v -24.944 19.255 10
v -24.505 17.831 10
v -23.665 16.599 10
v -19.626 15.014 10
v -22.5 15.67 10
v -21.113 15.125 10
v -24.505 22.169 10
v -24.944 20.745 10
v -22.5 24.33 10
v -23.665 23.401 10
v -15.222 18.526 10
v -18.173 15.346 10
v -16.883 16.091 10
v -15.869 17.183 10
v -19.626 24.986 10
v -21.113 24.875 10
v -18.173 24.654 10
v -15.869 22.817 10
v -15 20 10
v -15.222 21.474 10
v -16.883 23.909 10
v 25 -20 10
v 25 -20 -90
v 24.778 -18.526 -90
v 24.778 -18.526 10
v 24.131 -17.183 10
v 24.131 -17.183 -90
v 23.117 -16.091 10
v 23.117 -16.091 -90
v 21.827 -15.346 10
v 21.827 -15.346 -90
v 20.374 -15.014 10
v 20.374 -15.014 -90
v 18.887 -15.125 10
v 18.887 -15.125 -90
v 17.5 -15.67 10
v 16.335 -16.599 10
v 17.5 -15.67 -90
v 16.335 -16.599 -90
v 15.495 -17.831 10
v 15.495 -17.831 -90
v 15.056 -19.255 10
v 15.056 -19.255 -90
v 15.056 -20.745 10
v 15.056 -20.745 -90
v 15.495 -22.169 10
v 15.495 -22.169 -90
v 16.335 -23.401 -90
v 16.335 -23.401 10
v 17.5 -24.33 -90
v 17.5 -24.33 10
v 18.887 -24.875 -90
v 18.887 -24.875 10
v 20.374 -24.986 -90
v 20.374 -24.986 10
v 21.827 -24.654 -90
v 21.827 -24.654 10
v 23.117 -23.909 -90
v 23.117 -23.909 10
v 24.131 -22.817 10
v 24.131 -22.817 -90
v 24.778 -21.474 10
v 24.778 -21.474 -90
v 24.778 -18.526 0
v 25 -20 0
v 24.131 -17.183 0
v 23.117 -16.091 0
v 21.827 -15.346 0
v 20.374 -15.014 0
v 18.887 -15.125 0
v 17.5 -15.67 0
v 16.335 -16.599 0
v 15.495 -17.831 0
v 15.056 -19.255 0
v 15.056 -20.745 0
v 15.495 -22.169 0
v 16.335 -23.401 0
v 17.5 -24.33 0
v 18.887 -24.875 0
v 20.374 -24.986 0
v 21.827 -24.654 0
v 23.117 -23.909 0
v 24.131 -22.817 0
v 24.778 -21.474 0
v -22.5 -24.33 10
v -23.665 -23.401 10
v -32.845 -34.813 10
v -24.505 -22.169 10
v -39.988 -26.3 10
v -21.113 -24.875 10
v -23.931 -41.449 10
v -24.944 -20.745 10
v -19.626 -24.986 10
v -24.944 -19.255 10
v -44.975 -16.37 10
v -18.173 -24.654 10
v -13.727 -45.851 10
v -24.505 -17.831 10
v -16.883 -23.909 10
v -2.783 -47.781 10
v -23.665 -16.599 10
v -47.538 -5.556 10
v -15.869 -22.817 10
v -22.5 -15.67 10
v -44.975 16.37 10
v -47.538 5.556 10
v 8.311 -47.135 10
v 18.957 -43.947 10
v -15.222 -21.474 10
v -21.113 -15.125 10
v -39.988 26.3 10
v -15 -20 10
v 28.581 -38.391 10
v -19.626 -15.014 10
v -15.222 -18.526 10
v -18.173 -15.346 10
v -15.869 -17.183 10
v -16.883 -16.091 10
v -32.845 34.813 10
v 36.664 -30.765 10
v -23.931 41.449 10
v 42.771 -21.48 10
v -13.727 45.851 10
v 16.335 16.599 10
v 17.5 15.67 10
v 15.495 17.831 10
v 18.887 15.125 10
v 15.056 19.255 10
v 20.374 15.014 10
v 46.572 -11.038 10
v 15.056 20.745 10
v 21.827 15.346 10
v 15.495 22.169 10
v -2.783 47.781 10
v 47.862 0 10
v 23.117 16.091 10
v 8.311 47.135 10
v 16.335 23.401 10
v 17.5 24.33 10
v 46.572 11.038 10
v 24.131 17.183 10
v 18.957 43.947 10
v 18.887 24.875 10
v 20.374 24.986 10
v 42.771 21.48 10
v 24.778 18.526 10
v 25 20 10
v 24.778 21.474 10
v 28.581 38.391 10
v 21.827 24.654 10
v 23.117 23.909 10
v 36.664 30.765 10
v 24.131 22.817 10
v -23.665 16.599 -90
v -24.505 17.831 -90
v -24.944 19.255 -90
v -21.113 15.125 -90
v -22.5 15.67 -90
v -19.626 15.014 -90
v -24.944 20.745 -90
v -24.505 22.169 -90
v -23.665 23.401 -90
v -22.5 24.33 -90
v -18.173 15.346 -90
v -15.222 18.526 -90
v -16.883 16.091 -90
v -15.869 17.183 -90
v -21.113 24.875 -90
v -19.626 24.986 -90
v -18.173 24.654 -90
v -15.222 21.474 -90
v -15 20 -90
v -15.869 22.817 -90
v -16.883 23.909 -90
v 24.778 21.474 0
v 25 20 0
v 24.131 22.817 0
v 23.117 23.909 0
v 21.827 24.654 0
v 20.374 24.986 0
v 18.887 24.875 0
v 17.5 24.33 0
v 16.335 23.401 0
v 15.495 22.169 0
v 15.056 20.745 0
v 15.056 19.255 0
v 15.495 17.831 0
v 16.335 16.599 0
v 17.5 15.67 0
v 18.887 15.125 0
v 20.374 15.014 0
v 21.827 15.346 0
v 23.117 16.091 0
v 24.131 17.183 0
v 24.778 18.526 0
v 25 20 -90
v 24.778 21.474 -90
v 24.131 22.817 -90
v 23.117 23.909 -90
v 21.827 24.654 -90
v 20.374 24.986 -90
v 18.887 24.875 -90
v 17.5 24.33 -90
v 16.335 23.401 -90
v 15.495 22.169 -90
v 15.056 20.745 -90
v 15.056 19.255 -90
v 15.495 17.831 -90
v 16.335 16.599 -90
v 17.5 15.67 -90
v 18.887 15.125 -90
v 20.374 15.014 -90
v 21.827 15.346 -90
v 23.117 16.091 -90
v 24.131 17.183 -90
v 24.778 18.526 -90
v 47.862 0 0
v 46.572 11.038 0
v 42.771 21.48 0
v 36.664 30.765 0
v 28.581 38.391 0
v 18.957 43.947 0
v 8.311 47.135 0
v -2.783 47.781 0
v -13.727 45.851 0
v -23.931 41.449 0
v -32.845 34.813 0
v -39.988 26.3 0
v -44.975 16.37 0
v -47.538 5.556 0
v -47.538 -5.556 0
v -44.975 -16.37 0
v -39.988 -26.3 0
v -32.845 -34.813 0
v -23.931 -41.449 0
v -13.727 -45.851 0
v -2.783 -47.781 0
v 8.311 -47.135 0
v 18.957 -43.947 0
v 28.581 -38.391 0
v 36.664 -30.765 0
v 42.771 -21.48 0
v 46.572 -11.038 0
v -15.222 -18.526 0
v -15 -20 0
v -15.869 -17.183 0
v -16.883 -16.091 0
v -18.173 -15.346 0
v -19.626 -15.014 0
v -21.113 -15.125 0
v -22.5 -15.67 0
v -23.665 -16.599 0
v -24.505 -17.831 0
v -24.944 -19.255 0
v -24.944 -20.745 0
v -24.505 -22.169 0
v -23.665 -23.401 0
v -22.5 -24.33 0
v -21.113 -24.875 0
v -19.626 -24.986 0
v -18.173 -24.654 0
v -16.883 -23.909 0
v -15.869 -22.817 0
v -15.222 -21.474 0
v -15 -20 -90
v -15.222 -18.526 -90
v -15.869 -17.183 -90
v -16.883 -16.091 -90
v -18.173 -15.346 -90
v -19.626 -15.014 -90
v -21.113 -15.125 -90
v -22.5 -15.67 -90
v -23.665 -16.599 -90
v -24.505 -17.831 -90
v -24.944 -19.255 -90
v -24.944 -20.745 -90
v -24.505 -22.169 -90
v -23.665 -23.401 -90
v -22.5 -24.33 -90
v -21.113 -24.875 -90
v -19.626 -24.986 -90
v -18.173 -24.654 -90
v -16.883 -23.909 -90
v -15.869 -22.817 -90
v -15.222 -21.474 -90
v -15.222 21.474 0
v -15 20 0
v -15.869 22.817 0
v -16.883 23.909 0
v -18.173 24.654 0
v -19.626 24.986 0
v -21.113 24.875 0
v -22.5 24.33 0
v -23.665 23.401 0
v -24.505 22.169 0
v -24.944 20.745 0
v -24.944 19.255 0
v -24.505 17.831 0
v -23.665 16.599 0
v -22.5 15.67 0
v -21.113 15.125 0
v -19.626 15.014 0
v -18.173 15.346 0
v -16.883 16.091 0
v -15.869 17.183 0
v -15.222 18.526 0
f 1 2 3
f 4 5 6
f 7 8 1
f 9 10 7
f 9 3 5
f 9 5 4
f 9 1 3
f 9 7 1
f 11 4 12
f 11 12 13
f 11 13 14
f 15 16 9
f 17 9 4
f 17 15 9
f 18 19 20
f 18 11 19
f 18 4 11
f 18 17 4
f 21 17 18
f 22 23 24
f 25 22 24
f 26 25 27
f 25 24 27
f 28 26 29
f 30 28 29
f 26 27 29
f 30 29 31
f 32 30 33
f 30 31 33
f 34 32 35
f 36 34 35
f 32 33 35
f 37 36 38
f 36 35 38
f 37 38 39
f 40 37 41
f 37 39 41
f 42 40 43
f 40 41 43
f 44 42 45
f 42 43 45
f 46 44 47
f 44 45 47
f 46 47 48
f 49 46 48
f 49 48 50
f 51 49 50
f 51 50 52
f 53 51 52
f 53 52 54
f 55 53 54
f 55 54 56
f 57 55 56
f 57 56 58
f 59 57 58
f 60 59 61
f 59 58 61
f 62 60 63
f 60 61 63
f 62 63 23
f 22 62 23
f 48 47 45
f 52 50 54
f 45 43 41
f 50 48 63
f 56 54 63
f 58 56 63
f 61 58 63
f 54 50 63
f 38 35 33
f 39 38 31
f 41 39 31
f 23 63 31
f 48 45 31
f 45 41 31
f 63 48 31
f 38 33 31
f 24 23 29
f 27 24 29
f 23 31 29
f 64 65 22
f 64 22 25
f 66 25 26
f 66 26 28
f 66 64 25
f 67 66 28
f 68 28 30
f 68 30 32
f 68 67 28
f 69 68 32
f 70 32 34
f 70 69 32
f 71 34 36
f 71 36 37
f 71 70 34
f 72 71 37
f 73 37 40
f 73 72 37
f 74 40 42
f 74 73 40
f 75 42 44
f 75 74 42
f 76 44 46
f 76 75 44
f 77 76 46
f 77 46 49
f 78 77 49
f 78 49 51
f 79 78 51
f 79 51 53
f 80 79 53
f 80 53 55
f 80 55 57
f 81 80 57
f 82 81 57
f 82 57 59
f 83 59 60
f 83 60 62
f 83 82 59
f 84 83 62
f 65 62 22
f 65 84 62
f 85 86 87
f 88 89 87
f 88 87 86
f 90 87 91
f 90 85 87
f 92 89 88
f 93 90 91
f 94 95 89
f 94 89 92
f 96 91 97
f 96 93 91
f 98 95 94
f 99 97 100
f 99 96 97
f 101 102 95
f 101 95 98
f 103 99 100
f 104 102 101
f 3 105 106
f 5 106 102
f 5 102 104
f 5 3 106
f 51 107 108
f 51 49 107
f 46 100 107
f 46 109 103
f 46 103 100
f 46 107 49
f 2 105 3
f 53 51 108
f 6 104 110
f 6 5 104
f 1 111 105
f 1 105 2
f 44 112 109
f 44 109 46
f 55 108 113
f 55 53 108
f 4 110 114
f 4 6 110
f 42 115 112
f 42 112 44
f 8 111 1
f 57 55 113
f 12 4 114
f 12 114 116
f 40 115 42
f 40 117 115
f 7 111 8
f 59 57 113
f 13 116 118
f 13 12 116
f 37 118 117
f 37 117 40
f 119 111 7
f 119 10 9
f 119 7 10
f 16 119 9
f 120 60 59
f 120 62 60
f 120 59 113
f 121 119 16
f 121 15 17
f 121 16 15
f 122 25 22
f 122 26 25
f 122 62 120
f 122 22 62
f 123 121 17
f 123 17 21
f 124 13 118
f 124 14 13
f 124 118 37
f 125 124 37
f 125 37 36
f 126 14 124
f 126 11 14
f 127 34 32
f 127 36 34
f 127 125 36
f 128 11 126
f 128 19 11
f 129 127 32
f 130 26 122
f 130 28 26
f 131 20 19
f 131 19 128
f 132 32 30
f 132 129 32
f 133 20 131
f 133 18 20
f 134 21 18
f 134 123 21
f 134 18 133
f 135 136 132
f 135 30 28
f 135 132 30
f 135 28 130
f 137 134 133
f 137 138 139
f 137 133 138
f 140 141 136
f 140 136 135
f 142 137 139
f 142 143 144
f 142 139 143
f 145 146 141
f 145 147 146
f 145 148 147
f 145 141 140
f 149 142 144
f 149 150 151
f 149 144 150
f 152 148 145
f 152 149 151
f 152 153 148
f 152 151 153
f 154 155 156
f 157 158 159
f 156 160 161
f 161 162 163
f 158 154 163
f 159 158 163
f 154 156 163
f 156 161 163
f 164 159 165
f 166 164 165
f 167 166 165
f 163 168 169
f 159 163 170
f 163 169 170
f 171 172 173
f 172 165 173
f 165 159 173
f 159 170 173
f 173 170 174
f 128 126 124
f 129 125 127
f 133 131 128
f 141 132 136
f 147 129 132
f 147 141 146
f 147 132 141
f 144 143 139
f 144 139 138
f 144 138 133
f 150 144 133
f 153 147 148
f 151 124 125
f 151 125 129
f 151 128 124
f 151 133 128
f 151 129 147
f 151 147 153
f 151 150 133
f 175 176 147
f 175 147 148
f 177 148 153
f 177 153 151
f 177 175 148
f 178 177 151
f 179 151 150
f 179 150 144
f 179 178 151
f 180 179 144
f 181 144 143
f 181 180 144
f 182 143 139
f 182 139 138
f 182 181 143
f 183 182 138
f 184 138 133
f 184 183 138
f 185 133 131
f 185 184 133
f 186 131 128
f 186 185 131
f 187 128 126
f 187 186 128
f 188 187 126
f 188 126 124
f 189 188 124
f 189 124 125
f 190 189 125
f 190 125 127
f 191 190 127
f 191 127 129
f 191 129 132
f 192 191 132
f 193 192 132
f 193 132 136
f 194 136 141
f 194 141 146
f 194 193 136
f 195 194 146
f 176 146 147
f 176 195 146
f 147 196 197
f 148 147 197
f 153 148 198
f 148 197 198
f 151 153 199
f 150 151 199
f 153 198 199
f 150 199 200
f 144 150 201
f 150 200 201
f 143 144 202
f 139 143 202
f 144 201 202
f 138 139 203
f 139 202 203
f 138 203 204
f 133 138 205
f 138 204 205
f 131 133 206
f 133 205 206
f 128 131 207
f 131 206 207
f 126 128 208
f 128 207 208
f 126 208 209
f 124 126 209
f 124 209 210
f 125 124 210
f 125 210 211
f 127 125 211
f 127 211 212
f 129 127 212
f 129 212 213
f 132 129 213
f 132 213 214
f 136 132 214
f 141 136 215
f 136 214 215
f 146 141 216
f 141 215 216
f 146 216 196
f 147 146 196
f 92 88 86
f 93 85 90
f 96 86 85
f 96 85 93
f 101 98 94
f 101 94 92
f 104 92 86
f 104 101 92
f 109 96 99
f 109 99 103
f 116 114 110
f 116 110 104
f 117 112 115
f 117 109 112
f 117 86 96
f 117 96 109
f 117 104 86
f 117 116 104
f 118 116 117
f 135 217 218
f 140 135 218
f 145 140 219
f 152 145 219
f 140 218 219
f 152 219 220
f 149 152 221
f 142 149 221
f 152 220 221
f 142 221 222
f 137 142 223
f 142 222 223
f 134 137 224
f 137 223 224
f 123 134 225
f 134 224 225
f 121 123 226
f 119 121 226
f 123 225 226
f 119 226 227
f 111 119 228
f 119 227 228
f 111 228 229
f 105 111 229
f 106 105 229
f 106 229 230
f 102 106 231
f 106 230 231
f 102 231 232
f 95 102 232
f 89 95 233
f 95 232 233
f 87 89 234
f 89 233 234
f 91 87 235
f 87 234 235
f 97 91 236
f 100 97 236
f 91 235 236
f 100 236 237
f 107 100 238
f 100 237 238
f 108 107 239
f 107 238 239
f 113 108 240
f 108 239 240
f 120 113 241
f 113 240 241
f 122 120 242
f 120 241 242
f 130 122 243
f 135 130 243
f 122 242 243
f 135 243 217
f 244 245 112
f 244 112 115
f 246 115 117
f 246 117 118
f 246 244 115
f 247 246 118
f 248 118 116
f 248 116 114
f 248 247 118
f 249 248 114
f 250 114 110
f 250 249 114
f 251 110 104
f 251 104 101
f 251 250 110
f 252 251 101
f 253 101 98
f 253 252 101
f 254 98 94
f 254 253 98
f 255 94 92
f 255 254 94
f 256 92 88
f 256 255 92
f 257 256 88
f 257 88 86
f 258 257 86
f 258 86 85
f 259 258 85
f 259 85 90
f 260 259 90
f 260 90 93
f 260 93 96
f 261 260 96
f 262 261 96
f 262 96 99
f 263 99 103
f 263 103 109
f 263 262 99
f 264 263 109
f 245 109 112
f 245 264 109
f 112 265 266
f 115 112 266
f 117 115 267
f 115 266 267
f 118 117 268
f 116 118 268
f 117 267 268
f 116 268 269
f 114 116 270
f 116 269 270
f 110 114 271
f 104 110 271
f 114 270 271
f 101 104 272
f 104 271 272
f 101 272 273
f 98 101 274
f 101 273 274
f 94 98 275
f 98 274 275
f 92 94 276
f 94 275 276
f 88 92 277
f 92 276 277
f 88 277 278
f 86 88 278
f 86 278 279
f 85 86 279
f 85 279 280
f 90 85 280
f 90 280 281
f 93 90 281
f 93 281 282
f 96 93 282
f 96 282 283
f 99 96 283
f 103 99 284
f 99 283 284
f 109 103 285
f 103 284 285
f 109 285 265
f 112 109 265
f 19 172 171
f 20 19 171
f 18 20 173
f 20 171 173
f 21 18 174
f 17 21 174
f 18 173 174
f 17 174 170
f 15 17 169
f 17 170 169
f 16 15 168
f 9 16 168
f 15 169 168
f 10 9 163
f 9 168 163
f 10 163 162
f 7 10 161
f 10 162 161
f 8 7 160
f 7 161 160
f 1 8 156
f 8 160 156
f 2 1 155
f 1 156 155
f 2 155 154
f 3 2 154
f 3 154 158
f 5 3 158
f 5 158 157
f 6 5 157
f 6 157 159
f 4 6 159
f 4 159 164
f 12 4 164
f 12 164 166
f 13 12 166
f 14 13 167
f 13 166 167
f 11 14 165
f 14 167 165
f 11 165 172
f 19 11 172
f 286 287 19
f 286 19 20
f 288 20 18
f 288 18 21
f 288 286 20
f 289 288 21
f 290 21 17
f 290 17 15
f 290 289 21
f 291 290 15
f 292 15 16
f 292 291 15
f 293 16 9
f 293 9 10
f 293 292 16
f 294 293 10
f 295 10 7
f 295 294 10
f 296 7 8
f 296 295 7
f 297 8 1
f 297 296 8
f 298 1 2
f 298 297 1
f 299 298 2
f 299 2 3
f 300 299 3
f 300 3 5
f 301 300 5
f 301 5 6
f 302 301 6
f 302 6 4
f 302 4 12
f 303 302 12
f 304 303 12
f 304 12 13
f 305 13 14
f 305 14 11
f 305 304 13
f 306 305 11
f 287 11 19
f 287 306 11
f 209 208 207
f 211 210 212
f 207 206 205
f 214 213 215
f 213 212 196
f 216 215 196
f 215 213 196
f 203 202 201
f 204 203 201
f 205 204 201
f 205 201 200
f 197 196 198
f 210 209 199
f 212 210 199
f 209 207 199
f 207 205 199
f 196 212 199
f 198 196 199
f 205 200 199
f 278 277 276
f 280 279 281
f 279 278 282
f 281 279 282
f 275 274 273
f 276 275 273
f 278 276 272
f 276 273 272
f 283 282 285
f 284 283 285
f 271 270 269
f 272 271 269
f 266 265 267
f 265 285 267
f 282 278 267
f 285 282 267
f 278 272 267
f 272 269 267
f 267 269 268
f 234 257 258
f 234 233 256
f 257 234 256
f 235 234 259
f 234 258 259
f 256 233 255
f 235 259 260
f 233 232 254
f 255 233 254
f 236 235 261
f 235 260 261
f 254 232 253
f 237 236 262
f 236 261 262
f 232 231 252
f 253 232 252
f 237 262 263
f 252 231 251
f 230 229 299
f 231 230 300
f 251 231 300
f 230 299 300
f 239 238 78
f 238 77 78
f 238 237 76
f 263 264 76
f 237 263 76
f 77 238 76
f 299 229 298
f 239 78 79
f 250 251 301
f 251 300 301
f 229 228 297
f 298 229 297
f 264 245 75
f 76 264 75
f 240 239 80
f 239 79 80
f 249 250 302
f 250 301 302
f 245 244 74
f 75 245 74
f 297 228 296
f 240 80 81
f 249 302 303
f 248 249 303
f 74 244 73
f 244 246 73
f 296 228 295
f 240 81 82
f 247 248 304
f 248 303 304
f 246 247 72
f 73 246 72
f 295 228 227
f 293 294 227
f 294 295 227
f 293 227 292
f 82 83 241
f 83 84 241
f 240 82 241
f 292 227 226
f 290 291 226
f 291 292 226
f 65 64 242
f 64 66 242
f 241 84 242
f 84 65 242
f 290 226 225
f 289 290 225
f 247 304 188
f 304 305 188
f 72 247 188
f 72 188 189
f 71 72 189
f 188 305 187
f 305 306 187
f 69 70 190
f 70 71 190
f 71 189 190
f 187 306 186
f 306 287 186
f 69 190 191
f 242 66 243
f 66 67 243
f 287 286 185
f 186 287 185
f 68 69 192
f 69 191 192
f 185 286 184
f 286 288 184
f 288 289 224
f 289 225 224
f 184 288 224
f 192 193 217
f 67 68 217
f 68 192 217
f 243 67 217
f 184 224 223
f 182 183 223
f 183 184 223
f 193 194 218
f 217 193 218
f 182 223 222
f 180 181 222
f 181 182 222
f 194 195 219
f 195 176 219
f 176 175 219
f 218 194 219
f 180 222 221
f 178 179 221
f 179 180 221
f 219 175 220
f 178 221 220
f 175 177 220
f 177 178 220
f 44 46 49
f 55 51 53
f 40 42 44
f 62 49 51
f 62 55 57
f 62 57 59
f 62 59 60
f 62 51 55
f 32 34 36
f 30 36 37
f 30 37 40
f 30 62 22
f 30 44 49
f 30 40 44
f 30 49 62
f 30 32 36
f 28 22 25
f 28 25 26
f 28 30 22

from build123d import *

# Parameters (mm, degrees)
SKETCH_R          = 47.861734
SKETCH_R_2        = 5
PAD_DEPTH         = 10
CYLINDER_R        = 5
CYLINDER_DEPTH    = 100
CYLINDER001_R     = 5
CYLINDER001_DEPTH = 100
CYLINDER002_R     = 5
CYLINDER002_DEPTH = 100
CYLINDER003_R     = 5
CYLINDER003_DEPTH = 100


with BuildPart() as body:
    # Sketch → Pad (new body)
    with BuildSketch(Plane.XY):
        Circle(SKETCH_R)
        with Locations((-20, 20)):
            Circle(SKETCH_R_2, mode=Mode.SUBTRACT)
        with Locations((-20, -20)):
            Circle(SKETCH_R_2, mode=Mode.SUBTRACT)
        with Locations((20, 20)):
            Circle(SKETCH_R_2, mode=Mode.SUBTRACT)
        with Locations((20, -20)):
            Circle(SKETCH_R_2, mode=Mode.SUBTRACT)
    extrude(amount=PAD_DEPTH)


with BuildPart() as cylinder:
    # Cylinder → Cylinder (new body)
    with BuildSketch(Plane(origin=(20, -20, -90), x_dir=(1, 0, 0), z_dir=(0, 0, 1))):
        Circle(CYLINDER_R)
    extrude(amount=CYLINDER_DEPTH)


with BuildPart() as cylinder001:
    # Cylinder001 → Cylinder001 (new body)
    with BuildSketch(Plane(origin=(20, 20, -90), x_dir=(1, 0, 0), z_dir=(0, 0, 1))):
        Circle(CYLINDER001_R)
    extrude(amount=CYLINDER001_DEPTH)


with BuildPart() as cylinder002:
    # Cylinder002 → Cylinder002 (new body)
    with BuildSketch(Plane(origin=(-20, 20, -90), x_dir=(1, 0, 0), z_dir=(0, 0, 1))):
        Circle(CYLINDER002_R)
    extrude(amount=CYLINDER002_DEPTH)


with BuildPart() as cylinder003:
    # Cylinder003 → Cylinder003 (new body)
    with BuildSketch(Plane(origin=(-20, -20, -90), x_dir=(1, 0, 0), z_dir=(0, 0, 1))):
        Circle(CYLINDER003_R)
    extrude(amount=CYLINDER003_DEPTH)


solid = Compound([body.part, cylinder.part, cylinder001.part, cylinder002.part, cylinder003.part])
